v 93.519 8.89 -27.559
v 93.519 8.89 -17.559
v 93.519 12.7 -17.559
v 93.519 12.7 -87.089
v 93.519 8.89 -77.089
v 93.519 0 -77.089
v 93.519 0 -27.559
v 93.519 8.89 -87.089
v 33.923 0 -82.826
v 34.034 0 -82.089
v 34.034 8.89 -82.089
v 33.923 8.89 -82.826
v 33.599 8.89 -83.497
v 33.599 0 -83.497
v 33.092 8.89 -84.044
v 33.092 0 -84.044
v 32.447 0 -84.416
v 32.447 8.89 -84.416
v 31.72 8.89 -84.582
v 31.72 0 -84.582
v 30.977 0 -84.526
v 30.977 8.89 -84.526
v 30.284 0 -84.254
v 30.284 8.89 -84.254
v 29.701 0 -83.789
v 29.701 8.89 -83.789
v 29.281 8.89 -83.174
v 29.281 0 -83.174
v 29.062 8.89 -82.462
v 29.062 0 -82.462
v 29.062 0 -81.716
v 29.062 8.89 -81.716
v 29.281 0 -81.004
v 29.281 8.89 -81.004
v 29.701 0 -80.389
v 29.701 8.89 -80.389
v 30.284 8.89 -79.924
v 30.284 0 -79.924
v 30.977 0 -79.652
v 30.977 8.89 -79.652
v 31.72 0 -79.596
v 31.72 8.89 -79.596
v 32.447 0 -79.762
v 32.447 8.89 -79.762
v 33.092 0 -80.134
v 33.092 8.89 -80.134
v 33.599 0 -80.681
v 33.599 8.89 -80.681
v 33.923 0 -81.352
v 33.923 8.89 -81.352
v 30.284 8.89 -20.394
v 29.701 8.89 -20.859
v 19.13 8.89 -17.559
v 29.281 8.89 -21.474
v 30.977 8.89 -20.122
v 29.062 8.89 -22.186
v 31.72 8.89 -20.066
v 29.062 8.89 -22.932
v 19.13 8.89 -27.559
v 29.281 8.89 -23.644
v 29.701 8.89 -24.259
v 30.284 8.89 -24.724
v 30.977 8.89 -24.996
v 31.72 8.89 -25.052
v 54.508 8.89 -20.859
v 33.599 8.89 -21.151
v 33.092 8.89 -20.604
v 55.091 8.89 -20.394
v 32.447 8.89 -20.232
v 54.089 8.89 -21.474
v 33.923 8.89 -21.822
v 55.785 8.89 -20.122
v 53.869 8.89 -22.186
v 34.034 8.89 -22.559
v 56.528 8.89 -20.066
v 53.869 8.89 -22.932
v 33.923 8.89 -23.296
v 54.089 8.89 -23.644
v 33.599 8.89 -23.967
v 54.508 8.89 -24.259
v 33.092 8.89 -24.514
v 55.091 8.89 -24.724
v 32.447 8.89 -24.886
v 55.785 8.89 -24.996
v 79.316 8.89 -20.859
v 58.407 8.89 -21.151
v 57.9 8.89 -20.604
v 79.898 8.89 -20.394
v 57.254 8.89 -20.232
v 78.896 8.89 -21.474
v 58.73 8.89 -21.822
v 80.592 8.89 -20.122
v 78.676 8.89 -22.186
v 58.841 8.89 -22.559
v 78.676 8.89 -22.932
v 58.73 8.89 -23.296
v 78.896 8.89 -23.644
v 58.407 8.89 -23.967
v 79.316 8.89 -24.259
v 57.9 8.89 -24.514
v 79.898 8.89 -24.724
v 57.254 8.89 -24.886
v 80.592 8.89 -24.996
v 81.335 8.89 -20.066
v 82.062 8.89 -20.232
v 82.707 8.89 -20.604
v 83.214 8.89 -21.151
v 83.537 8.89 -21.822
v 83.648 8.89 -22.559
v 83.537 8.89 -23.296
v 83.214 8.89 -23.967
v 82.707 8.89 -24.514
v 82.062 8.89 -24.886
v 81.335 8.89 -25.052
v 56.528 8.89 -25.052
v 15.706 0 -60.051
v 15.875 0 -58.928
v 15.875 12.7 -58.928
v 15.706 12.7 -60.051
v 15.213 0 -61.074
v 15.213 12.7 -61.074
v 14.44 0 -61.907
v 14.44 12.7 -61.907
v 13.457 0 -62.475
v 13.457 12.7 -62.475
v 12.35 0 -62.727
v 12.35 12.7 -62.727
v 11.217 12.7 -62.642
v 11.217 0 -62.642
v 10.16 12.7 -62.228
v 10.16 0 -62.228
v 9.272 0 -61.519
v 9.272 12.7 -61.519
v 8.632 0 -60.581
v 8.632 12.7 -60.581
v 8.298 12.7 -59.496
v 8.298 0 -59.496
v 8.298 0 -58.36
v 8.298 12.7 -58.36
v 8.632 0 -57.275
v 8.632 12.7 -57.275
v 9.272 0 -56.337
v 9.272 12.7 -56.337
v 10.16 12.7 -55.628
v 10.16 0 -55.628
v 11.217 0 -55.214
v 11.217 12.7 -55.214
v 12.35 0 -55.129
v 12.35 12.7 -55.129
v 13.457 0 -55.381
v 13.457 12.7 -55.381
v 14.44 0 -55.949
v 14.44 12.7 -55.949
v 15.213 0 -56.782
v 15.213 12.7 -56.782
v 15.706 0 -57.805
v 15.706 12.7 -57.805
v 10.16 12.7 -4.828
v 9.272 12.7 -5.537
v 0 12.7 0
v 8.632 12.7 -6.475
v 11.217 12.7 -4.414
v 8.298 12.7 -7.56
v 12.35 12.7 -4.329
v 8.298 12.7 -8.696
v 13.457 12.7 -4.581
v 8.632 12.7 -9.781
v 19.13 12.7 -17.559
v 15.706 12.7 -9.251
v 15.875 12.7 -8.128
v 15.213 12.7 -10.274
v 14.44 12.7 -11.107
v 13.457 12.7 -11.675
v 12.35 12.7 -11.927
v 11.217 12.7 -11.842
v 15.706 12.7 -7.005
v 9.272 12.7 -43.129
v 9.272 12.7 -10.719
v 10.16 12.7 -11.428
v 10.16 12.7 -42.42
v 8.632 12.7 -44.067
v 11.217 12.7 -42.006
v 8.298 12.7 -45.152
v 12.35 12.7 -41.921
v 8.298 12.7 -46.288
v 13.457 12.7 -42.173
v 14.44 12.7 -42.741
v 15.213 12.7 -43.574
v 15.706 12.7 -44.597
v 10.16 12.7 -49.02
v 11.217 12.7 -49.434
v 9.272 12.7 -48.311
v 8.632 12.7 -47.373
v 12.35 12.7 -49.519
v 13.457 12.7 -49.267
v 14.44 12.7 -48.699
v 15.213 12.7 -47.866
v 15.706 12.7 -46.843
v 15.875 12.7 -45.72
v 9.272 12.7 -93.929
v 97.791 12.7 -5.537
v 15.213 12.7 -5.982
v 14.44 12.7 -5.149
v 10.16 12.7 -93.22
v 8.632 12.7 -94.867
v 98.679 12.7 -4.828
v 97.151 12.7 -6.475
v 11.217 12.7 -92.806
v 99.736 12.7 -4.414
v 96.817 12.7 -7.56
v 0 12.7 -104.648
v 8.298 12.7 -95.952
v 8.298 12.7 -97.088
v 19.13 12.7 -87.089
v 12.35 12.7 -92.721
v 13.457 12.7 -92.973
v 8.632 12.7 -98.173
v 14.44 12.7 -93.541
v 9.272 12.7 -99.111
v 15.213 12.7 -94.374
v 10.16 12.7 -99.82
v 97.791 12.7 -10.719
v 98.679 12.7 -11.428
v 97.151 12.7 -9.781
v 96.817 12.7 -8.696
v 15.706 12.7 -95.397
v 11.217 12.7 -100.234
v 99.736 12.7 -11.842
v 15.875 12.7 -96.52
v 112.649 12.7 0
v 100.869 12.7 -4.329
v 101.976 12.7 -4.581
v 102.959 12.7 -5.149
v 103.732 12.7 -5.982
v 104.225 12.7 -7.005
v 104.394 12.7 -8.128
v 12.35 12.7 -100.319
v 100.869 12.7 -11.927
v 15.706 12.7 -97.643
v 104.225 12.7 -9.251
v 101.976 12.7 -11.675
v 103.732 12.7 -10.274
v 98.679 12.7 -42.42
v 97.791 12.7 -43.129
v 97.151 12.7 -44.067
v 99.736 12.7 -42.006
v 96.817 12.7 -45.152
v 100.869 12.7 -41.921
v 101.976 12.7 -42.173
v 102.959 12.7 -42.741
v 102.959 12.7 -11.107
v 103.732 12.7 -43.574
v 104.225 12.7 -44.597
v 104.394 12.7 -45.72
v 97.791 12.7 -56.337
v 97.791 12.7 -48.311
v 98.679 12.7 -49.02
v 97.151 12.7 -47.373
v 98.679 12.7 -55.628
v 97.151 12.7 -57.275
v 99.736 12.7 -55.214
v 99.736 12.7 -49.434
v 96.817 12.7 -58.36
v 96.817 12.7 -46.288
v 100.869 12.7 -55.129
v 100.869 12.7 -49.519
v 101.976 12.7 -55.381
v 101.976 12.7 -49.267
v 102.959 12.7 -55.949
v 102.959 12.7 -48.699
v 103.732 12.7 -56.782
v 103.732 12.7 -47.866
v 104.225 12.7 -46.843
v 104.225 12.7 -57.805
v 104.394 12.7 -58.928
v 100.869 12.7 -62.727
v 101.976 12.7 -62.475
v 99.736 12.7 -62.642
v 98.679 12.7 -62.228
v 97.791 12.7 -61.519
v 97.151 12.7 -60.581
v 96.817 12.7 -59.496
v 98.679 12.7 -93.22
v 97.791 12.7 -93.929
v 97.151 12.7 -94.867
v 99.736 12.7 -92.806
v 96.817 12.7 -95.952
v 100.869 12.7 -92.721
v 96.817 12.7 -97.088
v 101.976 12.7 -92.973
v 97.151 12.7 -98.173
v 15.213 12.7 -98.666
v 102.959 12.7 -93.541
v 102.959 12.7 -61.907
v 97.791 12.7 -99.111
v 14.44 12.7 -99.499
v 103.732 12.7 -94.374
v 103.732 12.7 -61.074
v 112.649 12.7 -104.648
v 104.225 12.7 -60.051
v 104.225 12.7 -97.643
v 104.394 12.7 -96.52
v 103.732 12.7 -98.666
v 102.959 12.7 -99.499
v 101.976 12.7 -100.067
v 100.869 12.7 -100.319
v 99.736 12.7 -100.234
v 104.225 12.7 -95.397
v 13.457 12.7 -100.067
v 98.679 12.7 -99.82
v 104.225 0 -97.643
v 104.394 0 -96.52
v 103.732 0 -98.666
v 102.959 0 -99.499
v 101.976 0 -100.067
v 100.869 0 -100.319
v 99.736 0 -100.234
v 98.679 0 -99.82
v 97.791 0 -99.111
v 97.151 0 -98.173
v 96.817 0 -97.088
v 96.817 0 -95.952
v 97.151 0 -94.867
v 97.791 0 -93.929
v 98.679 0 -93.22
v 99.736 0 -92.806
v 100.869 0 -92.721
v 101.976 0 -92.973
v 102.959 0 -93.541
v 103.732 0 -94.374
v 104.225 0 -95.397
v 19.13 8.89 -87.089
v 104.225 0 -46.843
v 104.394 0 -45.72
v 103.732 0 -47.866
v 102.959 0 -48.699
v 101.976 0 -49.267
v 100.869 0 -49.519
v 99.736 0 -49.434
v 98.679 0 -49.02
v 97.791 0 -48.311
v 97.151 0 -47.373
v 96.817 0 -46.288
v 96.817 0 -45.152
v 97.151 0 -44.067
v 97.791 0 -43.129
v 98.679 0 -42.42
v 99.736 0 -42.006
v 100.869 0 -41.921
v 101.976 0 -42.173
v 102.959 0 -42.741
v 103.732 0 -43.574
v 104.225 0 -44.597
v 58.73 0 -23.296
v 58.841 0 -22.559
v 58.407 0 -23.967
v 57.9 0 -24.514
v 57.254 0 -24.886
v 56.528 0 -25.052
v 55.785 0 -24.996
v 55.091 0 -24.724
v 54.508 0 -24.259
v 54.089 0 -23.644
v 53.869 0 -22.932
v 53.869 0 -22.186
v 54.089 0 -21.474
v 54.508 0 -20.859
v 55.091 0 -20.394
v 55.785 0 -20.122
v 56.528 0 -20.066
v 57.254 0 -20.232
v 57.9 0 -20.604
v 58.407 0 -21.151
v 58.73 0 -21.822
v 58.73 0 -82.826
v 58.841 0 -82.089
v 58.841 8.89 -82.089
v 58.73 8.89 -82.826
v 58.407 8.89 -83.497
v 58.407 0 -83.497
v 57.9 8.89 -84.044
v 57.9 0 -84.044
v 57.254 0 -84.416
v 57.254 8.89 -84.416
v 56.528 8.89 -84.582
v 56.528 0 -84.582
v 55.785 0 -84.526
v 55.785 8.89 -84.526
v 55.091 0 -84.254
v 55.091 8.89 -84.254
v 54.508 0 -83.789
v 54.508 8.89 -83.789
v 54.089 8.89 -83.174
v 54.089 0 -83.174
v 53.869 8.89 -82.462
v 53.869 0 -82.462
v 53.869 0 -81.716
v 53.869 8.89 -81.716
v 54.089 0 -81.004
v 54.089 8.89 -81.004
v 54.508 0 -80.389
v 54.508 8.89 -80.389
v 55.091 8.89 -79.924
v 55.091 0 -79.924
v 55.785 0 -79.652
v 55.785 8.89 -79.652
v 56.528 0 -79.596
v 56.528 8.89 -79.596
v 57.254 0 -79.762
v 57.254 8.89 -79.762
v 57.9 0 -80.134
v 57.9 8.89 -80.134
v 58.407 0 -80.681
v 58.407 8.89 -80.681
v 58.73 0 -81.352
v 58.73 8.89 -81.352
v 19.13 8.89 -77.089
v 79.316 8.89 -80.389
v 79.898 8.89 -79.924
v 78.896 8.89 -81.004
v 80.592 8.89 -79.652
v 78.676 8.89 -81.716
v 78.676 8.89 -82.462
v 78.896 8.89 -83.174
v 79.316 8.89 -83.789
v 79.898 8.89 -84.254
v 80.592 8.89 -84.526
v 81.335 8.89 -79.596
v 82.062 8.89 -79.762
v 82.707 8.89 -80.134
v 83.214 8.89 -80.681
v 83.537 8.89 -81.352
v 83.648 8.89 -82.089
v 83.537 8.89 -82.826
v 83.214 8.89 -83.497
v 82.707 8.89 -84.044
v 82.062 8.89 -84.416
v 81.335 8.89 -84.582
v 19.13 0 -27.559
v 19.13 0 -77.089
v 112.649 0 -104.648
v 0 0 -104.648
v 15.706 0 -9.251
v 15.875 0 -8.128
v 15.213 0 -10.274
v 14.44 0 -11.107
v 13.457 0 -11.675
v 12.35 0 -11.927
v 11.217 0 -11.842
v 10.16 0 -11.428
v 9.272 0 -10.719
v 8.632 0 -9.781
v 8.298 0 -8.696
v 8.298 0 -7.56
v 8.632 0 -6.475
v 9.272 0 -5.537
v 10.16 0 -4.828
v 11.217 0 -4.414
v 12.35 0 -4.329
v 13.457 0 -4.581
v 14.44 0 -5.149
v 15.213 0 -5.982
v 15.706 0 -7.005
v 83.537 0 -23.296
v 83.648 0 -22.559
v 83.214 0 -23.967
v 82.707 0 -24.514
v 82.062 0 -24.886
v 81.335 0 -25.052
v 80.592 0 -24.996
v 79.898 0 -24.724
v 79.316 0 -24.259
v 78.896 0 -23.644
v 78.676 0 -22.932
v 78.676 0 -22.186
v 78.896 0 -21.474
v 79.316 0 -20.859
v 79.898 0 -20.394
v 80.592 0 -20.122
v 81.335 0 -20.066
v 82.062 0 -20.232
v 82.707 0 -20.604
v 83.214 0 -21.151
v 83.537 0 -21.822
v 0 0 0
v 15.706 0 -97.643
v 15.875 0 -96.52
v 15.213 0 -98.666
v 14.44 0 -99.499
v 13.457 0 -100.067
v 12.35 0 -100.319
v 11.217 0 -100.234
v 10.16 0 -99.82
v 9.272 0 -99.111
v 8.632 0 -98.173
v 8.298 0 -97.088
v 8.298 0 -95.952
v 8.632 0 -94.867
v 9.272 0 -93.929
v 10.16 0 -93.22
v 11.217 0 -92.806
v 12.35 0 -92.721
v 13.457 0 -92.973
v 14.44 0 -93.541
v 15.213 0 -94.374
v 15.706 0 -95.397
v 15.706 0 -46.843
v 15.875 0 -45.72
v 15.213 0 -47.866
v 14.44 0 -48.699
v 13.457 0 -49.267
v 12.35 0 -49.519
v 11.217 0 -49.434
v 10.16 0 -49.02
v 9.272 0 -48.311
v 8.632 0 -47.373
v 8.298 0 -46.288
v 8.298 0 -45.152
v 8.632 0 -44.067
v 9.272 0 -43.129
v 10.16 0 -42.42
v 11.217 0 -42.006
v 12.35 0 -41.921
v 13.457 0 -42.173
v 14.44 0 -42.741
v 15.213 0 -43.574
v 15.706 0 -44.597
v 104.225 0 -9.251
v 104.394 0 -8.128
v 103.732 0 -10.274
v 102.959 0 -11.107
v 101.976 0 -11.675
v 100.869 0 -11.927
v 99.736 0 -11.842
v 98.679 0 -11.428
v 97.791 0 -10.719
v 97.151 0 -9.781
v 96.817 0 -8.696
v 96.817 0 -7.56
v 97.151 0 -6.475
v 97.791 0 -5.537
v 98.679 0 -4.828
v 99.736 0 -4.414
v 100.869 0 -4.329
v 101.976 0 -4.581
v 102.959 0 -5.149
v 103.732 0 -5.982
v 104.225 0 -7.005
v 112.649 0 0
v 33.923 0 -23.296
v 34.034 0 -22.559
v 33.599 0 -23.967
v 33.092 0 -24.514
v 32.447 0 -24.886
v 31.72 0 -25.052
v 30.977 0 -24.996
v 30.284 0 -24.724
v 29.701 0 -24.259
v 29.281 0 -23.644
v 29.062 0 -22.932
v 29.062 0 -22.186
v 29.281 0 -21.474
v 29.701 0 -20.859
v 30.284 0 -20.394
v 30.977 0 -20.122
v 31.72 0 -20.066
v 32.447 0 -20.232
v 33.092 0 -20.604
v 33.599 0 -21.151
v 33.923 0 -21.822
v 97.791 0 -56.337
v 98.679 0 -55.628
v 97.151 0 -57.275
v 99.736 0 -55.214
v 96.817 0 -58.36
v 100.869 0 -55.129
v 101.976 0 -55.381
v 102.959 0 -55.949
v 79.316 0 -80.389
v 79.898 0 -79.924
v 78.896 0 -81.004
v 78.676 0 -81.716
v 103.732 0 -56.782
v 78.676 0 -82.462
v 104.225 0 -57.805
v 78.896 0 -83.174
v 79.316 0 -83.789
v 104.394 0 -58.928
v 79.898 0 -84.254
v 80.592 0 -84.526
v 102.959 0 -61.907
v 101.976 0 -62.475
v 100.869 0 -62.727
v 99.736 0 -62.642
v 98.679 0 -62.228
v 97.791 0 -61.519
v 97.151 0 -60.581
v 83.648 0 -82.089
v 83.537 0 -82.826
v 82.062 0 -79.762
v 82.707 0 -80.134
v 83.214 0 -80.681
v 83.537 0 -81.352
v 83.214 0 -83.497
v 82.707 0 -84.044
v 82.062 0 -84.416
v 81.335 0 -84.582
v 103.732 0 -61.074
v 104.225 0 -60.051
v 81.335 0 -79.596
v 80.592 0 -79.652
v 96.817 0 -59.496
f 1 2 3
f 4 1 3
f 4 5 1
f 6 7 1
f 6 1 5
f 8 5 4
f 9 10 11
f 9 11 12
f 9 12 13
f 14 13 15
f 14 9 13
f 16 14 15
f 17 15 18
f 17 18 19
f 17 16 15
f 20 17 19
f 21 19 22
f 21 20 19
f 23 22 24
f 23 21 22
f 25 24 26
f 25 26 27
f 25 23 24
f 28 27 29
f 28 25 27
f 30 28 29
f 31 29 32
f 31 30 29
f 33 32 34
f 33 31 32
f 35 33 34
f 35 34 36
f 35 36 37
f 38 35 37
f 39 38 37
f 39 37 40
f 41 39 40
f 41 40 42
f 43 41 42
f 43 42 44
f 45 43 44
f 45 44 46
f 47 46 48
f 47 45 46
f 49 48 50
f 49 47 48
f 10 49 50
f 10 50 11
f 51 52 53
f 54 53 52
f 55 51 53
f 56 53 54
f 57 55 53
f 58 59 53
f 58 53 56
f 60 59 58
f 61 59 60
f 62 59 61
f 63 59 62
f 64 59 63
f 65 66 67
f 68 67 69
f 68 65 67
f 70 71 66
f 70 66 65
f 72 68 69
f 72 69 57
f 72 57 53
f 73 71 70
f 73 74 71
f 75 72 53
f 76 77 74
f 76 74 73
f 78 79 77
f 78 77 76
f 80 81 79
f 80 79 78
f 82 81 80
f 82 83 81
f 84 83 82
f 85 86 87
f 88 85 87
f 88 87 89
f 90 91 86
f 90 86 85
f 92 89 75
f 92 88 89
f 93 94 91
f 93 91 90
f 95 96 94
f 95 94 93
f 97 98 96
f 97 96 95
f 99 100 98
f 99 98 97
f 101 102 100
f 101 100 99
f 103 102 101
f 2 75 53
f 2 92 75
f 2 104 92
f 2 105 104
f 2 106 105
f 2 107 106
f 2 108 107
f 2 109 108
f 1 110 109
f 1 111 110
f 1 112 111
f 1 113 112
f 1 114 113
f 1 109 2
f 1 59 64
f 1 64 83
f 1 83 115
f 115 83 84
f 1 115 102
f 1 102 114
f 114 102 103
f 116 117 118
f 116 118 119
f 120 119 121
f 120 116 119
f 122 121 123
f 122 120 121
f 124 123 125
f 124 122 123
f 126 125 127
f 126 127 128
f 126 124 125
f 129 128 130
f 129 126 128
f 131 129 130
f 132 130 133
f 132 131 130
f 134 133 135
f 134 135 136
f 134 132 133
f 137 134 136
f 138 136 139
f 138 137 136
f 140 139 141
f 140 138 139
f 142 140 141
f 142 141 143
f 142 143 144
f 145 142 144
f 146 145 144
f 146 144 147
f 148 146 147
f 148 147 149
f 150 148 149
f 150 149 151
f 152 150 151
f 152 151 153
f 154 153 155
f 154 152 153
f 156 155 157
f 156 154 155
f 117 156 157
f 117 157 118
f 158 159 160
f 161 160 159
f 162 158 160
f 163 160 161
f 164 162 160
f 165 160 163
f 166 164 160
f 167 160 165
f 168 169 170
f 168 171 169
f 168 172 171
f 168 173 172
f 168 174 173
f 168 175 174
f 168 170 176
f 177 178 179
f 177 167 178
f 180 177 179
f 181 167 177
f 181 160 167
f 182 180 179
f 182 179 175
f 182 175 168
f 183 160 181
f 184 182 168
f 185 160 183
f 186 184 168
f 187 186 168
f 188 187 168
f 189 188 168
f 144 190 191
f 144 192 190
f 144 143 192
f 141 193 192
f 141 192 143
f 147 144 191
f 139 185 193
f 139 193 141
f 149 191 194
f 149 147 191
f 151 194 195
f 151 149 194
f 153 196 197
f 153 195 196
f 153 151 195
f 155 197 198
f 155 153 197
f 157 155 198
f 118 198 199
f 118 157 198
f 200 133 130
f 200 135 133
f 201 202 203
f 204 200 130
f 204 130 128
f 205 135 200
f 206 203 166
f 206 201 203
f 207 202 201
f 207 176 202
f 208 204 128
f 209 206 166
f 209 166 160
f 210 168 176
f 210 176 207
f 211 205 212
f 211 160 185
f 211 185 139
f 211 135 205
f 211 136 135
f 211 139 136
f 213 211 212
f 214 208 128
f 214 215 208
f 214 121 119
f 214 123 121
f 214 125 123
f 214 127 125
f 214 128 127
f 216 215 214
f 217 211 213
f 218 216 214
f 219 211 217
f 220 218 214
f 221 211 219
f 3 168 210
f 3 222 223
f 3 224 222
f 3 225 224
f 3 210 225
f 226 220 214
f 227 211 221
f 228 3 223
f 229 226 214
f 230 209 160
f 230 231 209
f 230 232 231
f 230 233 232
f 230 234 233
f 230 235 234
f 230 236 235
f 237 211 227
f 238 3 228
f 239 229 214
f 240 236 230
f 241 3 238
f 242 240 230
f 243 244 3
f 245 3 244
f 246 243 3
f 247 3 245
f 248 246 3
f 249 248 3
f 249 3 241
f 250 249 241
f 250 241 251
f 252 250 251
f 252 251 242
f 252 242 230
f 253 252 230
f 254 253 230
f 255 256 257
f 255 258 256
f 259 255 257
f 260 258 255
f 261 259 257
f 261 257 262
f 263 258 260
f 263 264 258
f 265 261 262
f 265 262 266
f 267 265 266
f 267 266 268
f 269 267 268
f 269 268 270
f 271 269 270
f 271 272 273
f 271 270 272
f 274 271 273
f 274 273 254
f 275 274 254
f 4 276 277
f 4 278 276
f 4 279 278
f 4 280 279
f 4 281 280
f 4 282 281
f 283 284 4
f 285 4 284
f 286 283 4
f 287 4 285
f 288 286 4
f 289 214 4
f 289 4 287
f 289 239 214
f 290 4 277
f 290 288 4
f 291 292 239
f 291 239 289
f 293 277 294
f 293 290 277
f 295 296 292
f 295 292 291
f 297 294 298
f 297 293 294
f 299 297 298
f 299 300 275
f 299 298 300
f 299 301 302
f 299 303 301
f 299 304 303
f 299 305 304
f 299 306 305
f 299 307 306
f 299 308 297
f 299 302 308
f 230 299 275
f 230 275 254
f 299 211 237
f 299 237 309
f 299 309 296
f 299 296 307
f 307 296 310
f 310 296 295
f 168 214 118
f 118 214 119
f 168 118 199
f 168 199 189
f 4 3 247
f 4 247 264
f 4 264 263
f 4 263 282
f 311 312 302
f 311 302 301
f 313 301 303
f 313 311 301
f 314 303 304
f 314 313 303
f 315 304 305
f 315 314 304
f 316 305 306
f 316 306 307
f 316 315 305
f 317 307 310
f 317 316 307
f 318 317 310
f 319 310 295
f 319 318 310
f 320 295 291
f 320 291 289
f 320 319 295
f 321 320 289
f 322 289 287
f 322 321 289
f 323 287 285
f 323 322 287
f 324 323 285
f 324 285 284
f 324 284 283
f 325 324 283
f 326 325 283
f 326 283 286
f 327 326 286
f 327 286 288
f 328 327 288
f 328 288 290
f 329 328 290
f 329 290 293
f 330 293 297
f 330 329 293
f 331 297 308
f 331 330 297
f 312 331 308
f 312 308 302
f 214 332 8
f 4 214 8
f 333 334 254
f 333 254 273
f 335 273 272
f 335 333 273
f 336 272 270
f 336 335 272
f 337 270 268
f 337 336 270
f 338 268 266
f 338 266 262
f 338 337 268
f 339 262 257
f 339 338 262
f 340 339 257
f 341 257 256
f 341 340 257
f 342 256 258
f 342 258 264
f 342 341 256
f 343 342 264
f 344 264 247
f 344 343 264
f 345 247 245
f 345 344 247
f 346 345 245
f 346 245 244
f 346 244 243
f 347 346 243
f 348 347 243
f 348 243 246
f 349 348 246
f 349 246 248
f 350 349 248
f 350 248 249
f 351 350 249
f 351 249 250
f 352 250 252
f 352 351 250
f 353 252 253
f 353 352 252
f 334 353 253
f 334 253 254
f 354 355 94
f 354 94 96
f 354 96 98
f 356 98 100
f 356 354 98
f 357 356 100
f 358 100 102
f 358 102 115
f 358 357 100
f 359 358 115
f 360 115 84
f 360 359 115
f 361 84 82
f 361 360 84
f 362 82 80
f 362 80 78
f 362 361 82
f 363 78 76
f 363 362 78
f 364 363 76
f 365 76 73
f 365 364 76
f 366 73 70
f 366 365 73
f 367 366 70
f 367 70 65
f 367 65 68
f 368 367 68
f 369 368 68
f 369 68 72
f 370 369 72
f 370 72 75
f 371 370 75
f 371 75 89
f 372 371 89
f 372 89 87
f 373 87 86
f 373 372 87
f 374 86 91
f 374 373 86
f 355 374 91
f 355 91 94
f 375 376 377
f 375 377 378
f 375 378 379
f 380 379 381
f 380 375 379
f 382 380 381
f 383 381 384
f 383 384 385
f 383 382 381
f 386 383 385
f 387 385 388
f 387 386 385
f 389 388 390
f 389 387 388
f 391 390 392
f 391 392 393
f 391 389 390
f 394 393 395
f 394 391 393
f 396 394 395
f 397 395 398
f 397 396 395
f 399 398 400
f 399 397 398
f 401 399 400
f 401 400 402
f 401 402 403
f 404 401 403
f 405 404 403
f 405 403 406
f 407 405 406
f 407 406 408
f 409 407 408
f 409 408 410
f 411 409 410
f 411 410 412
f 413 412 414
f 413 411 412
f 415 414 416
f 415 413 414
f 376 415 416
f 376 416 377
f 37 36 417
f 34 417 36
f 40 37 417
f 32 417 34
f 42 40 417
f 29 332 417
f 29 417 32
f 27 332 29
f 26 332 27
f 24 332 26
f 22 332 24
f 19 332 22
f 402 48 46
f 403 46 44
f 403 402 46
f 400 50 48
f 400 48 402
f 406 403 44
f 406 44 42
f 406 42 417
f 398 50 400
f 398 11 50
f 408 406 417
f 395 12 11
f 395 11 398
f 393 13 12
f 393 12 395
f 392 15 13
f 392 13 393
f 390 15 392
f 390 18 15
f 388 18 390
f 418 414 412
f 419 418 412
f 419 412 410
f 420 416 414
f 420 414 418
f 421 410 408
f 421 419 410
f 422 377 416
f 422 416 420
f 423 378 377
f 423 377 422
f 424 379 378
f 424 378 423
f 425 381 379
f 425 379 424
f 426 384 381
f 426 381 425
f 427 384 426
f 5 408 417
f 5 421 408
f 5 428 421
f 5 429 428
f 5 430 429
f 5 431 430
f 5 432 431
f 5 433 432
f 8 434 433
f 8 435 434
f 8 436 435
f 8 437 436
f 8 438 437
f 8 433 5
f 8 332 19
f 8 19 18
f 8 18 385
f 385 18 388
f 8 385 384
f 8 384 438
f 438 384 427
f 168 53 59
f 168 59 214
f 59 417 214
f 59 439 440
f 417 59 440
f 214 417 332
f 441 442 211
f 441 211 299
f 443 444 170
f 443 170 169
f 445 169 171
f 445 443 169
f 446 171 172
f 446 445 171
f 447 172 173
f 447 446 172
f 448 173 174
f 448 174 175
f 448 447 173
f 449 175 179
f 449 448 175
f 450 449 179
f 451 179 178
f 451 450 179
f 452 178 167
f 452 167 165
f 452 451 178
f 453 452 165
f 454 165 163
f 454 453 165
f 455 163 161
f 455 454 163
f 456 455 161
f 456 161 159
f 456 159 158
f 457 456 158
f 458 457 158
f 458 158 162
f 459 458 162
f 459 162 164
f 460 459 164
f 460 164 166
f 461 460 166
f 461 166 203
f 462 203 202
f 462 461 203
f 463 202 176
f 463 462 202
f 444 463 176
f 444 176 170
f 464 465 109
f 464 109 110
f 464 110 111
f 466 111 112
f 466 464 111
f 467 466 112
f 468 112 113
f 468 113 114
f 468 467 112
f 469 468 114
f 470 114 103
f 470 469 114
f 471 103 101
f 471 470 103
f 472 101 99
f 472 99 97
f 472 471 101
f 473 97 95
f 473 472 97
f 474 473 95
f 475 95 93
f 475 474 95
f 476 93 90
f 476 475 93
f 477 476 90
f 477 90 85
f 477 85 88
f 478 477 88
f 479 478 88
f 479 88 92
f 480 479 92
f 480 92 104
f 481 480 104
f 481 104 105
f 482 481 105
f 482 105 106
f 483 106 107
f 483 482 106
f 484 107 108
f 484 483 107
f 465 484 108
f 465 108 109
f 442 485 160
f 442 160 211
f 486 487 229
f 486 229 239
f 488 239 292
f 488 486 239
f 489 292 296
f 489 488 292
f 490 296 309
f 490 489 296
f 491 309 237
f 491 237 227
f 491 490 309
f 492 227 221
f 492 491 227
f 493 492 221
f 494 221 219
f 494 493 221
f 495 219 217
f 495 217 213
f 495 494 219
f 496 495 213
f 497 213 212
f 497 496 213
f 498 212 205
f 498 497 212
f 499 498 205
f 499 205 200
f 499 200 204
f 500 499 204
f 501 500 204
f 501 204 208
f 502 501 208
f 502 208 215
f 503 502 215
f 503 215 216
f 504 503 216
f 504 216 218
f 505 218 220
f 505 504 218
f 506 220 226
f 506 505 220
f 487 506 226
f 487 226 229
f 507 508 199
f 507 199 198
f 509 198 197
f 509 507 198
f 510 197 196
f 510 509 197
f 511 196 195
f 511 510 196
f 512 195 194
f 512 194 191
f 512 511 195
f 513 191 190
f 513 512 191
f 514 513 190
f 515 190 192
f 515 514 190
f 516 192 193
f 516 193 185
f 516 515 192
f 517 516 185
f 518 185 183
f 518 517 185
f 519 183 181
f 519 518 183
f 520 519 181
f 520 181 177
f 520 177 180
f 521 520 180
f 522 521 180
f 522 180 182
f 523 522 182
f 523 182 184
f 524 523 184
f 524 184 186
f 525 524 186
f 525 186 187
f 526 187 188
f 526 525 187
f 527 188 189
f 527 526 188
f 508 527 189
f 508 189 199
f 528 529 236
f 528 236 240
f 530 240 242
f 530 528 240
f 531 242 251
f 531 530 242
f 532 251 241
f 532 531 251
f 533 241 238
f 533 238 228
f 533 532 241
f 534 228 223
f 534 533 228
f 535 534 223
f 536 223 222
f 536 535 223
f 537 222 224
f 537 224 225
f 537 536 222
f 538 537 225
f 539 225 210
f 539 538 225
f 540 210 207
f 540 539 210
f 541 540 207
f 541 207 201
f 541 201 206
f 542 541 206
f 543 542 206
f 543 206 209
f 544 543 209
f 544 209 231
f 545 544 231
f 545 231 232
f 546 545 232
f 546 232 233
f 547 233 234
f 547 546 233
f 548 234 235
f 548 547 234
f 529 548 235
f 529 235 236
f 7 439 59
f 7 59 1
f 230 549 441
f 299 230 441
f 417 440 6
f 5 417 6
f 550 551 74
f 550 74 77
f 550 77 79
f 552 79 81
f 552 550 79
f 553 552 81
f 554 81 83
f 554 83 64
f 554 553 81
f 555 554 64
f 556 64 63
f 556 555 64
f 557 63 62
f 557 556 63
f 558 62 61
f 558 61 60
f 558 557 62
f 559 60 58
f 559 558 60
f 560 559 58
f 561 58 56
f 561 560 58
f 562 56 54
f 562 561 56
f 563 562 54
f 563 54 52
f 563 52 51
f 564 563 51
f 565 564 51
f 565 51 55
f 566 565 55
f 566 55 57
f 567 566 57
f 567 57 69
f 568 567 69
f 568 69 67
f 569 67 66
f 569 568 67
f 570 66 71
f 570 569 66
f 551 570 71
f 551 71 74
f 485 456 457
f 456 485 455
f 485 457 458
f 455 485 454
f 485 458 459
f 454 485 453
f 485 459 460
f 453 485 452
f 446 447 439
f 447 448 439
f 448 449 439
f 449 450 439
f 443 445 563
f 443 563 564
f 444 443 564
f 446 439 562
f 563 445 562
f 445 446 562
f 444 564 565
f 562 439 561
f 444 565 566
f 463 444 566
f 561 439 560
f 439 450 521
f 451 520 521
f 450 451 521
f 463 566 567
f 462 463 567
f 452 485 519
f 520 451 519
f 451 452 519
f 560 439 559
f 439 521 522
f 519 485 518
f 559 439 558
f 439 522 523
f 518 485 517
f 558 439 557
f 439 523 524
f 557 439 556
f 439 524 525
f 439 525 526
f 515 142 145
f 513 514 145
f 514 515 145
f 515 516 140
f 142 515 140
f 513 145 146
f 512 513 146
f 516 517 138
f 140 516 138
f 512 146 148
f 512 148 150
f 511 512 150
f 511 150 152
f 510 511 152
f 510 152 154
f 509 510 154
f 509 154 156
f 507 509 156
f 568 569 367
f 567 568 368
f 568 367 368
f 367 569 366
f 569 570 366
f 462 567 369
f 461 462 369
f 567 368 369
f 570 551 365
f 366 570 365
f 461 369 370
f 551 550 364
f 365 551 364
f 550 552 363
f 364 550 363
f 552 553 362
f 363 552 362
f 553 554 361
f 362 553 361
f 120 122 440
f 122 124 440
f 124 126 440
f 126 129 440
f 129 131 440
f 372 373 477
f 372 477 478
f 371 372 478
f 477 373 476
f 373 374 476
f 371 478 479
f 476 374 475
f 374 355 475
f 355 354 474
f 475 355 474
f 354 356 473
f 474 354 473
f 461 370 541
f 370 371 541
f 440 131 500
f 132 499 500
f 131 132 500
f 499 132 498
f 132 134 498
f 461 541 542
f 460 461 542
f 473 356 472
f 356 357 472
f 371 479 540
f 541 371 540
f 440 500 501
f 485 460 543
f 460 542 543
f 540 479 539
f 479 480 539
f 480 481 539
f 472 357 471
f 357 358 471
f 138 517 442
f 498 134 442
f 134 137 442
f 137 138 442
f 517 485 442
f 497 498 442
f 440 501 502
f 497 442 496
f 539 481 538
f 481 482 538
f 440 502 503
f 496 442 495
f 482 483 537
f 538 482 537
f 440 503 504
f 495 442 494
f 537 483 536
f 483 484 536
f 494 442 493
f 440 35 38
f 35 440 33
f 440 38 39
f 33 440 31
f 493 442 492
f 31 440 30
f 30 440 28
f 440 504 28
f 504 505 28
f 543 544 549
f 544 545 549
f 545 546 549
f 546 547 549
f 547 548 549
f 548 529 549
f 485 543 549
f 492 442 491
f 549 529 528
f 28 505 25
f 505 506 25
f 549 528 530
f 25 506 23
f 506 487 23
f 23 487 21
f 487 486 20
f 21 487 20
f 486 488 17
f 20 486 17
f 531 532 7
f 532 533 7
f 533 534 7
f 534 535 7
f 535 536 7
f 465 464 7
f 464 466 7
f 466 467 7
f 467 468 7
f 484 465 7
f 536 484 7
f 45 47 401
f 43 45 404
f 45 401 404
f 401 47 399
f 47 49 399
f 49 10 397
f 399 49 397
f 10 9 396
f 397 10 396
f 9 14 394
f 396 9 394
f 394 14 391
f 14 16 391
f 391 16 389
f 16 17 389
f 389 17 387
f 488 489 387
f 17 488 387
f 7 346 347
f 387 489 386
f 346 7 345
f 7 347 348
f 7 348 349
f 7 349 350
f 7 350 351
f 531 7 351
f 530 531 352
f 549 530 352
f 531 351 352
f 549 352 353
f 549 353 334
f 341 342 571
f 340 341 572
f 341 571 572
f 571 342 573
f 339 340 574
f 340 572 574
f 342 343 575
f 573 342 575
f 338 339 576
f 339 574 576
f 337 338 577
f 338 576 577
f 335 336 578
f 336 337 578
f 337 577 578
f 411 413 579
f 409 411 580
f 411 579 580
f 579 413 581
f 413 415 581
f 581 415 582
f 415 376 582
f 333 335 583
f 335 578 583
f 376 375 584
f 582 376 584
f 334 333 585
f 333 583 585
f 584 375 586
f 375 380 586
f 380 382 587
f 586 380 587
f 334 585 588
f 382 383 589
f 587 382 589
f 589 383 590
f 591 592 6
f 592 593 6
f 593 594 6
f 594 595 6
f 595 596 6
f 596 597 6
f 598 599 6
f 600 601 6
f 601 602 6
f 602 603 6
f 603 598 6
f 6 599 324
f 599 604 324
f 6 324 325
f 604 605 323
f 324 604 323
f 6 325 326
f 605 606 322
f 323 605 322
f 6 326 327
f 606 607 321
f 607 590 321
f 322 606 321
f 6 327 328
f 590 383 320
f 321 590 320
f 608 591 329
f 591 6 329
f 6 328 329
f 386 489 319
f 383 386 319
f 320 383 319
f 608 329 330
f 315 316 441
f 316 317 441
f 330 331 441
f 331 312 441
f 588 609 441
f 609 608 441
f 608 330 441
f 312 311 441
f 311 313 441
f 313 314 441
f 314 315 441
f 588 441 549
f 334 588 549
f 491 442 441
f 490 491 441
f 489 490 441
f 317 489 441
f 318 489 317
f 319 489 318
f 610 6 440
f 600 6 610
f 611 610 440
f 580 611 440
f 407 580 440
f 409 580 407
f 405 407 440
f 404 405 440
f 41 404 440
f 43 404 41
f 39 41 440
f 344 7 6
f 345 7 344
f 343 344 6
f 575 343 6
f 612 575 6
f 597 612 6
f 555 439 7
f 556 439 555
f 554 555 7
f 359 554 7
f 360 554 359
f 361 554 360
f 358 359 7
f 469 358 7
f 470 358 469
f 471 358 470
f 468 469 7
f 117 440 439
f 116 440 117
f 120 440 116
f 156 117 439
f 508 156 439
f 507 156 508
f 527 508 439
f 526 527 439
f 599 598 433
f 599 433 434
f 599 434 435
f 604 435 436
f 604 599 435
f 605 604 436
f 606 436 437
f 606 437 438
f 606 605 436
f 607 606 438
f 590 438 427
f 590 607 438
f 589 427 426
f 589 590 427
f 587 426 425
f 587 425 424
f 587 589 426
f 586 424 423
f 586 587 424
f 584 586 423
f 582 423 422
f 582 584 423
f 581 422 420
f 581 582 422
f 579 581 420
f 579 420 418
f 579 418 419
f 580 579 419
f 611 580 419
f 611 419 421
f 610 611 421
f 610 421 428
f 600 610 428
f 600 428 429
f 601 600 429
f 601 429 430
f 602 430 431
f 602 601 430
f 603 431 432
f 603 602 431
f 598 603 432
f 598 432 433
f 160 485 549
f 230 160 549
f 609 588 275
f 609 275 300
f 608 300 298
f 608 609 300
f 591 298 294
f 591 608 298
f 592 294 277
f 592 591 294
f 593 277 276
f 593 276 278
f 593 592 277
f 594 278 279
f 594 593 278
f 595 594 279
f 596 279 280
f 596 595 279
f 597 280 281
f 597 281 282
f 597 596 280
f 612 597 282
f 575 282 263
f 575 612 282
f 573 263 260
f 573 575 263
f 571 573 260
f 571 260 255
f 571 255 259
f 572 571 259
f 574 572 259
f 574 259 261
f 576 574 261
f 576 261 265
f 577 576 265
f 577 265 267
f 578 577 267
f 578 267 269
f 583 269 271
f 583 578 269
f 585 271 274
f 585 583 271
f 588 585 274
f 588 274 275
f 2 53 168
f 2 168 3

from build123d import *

# Parameters (mm, degrees)
SKETCH2_W           = 112.649
SKETCH2_H           = 104.648
SKETCH2_R           = 3.81
BOSS_EXTRUDE5_DEPTH = 12.7
SKETCH2_4_W         = 74.389
SKETCH2_4_H         = 10
SKETCH2_4_R         = 2.5
BOSS_EXTRUDE7_DEPTH = 8.89


with BuildPart() as part:
    # Sketch2 → Boss-Extrude5 (new body)
    with BuildSketch(Plane(origin=(0, 0, 0), x_dir=(1, 0, 0), z_dir=(0, 1, 0))):
        with Locations((56.3245, 52.324)):
            Rectangle(SKETCH2_W, SKETCH2_H)
        with Locations((12.065, 8.128)):
            Circle(SKETCH2_R, mode=Mode.SUBTRACT)
        with Locations((12.065, 45.72)):
            Circle(SKETCH2_R, mode=Mode.SUBTRACT)
        with Locations((100.584, 8.128)):
            Circle(SKETCH2_R, mode=Mode.SUBTRACT)
        Polygon((19.13, 17.559), (19.13, 27.559), (19.13, 77.089), (19.13, 87.089), (93.519, 87.089), (93.519, 77.089), (93.519, 27.559), (93.519, 17.559), align=None, mode=Mode.SUBTRACT)
        with Locations((100.584, 45.72)):
            Circle(SKETCH2_R, mode=Mode.SUBTRACT)
        with Locations((12.065, 58.928)):
            Circle(SKETCH2_R, mode=Mode.SUBTRACT)
        with Locations((12.065, 96.52)):
            Circle(SKETCH2_R, mode=Mode.SUBTRACT)
        with Locations((100.584, 58.928)):
            Circle(SKETCH2_R, mode=Mode.SUBTRACT)
        with Locations((100.584, 96.52)):
            Circle(SKETCH2_R, mode=Mode.SUBTRACT)
    extrude(amount=BOSS_EXTRUDE5_DEPTH)

    # Sketch2<4> → Boss-Extrude7 (add)
    # profile 1 of 2: a face of its own
    with BuildSketch(Plane(origin=(0, 0, 0), x_dir=(1, 0, 0), z_dir=(0, 1, 0))):
        with Locations((56.3245, 22.559)):
            Rectangle(SKETCH2_4_W, SKETCH2_4_H)
        with Locations((31.533666667, 22.559)):
            Circle(SKETCH2_4_R, mode=Mode.SUBTRACT)
        with Locations((56.341, 22.559)):
            Circle(SKETCH2_4_R, mode=Mode.SUBTRACT)
        with Locations((81.148333333, 22.559)):
            Circle(SKETCH2_4_R, mode=Mode.SUBTRACT)
    # profile 2 of 2: a face of its own
    with BuildSketch(Plane(origin=(0, 0, 0), x_dir=(1, 0, 0), z_dir=(0, 1, 0))):
        with Locations((56.3245, 82.089)):
            Rectangle(SKETCH2_4_W, SKETCH2_4_H)
        with Locations((31.533666667, 82.089)):
            Circle(SKETCH2_4_R, mode=Mode.SUBTRACT)
        with Locations((56.341, 82.089)):
            Circle(SKETCH2_4_R, mode=Mode.SUBTRACT)
        with Locations((81.148333333, 82.089)):
            Circle(SKETCH2_4_R, mode=Mode.SUBTRACT)
    extrude(amount=BOSS_EXTRUDE7_DEPTH)


solid = part.part
